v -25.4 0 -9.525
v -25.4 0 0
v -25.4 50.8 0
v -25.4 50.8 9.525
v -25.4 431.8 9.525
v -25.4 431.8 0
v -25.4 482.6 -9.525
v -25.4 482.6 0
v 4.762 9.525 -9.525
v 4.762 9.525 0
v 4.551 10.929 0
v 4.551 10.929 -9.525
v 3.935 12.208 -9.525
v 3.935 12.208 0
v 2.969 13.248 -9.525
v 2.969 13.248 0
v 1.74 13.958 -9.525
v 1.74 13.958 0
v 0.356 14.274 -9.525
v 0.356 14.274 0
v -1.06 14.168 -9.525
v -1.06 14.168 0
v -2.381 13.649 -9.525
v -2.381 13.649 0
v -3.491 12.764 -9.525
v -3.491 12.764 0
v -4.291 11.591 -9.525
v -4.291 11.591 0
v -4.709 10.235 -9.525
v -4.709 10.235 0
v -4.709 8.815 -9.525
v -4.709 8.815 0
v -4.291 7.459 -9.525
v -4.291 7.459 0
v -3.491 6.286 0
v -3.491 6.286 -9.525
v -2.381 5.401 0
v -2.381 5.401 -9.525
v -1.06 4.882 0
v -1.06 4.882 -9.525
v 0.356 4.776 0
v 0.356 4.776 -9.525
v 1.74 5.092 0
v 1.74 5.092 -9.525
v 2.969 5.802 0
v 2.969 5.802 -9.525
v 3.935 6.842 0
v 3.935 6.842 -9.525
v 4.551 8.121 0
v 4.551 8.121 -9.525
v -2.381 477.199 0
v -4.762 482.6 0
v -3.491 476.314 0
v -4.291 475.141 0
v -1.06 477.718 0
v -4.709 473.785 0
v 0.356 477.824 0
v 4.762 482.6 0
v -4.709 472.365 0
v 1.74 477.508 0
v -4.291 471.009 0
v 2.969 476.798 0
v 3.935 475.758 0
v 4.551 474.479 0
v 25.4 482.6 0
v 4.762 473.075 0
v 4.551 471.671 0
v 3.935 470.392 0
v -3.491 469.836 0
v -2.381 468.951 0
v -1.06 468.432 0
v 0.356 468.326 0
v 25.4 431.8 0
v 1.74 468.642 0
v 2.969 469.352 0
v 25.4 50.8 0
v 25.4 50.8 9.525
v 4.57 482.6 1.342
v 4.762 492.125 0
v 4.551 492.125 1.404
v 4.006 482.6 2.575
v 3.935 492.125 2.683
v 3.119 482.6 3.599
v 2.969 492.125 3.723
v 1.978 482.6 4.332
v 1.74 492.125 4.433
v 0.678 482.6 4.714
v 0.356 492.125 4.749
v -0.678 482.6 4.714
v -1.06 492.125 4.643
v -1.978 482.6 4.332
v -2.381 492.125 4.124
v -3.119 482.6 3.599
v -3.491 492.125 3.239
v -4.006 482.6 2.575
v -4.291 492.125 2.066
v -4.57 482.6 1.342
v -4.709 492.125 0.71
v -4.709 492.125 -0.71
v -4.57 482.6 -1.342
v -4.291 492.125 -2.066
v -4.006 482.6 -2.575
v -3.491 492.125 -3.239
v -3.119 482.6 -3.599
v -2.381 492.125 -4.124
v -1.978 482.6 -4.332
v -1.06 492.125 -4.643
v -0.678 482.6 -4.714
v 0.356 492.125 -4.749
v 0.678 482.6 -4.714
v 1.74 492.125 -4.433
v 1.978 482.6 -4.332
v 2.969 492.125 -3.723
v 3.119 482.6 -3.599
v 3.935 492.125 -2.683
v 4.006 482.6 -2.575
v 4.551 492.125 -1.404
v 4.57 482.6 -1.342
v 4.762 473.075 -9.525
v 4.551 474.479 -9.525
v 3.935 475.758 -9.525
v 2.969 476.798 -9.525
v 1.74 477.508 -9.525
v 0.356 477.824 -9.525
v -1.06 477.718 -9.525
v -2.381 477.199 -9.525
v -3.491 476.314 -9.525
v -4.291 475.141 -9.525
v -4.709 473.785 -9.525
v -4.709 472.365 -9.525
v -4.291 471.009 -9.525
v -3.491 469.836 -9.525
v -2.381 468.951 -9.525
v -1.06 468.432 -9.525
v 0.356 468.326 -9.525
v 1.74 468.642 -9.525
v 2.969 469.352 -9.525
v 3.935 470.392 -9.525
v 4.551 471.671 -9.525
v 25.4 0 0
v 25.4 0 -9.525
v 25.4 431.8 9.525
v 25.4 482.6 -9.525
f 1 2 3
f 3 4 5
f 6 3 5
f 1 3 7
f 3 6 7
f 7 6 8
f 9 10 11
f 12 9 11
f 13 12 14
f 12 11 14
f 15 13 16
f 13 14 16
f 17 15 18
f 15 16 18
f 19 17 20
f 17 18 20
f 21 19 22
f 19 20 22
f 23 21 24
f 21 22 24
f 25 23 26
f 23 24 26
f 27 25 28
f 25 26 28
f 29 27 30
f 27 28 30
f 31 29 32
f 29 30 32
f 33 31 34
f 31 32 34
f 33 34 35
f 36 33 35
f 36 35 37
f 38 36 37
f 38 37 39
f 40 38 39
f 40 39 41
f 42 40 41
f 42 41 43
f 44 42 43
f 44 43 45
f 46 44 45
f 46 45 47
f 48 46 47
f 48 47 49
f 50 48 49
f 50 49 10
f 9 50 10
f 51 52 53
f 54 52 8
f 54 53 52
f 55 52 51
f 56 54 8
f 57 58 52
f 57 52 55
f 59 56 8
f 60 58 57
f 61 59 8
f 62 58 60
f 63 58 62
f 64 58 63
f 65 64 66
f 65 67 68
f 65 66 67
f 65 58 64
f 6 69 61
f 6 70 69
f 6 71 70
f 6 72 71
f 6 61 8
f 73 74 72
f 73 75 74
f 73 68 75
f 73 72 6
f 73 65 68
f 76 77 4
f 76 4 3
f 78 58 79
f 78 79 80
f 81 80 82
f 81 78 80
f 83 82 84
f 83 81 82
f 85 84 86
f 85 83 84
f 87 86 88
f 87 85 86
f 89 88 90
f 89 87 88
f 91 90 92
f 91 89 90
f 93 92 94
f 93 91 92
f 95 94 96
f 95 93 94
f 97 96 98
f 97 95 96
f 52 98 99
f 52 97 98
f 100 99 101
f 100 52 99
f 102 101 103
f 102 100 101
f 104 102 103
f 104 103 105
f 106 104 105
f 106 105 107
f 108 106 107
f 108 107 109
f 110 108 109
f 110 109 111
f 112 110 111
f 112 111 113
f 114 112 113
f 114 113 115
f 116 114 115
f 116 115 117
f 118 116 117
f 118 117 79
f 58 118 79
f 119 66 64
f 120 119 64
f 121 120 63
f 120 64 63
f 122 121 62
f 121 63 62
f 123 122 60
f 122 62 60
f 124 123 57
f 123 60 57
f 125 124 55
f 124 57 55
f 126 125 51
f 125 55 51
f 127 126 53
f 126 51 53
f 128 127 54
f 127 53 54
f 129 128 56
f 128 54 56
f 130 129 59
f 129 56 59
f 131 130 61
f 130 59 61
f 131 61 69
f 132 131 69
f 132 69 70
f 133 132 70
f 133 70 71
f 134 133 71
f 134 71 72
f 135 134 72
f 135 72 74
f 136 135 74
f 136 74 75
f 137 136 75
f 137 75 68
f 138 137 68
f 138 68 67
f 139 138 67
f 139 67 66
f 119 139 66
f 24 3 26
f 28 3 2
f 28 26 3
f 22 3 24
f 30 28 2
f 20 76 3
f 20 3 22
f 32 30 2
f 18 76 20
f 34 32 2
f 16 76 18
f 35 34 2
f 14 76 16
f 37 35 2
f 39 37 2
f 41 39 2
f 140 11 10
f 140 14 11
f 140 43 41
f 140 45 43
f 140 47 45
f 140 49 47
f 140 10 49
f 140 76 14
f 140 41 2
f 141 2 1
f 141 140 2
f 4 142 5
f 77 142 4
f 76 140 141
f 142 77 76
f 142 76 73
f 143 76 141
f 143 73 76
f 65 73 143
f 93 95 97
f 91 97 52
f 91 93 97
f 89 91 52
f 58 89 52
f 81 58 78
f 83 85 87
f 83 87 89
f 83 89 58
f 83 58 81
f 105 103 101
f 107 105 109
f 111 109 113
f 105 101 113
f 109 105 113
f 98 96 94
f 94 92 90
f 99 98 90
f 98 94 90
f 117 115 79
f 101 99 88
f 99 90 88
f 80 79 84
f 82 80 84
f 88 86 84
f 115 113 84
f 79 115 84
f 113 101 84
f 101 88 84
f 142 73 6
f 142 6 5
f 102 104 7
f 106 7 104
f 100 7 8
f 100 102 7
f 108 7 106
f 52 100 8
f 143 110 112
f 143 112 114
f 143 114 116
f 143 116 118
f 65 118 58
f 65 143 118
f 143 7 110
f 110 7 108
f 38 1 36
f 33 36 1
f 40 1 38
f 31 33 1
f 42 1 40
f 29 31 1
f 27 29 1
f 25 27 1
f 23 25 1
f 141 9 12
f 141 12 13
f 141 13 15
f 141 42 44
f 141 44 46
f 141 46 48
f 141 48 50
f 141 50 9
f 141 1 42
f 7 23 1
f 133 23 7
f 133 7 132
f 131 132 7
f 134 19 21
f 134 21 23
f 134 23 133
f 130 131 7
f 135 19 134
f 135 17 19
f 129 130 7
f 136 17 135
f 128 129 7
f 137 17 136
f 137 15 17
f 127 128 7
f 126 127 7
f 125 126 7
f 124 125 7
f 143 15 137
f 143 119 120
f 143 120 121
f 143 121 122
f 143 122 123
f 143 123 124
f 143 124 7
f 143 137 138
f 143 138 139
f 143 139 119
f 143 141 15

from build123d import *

# Parameters (mm, degrees)
F1_DEPTH = 25.4
F2_R     = 4.7625
F3_DEPTH = 25.4
F5_R     = 4.7625
F6_DEPTH = 9.525


with BuildPart() as f1:
    # F0 (on Right) → F1 (new body, symmetric)
    with BuildSketch(Plane.YZ):
        Polygon((0, -9.525), (482.6, -9.525), (482.6, 0), (431.8, 0), (431.8, 9.525), (50.8, 9.525), (50.8, 0), (0, 0), align=None)
    extrude(amount=F1_DEPTH, both=True)

    # F2 (on Top) → F3 (cut)
    with BuildSketch(Plane.XY):
        with Locations((0, 9.525)):
            Circle(F2_R)
        with Locations((0, 473.075)):
            Circle(F2_R)
    extrude(amount=-F3_DEPTH, mode=Mode.SUBTRACT)

    # F5 (on offset) → F6 (join)
    with BuildSketch(Plane.XZ.offset(-482.6)):
        Circle(F5_R)
    extrude(amount=-F6_DEPTH)


solid = f1.part
